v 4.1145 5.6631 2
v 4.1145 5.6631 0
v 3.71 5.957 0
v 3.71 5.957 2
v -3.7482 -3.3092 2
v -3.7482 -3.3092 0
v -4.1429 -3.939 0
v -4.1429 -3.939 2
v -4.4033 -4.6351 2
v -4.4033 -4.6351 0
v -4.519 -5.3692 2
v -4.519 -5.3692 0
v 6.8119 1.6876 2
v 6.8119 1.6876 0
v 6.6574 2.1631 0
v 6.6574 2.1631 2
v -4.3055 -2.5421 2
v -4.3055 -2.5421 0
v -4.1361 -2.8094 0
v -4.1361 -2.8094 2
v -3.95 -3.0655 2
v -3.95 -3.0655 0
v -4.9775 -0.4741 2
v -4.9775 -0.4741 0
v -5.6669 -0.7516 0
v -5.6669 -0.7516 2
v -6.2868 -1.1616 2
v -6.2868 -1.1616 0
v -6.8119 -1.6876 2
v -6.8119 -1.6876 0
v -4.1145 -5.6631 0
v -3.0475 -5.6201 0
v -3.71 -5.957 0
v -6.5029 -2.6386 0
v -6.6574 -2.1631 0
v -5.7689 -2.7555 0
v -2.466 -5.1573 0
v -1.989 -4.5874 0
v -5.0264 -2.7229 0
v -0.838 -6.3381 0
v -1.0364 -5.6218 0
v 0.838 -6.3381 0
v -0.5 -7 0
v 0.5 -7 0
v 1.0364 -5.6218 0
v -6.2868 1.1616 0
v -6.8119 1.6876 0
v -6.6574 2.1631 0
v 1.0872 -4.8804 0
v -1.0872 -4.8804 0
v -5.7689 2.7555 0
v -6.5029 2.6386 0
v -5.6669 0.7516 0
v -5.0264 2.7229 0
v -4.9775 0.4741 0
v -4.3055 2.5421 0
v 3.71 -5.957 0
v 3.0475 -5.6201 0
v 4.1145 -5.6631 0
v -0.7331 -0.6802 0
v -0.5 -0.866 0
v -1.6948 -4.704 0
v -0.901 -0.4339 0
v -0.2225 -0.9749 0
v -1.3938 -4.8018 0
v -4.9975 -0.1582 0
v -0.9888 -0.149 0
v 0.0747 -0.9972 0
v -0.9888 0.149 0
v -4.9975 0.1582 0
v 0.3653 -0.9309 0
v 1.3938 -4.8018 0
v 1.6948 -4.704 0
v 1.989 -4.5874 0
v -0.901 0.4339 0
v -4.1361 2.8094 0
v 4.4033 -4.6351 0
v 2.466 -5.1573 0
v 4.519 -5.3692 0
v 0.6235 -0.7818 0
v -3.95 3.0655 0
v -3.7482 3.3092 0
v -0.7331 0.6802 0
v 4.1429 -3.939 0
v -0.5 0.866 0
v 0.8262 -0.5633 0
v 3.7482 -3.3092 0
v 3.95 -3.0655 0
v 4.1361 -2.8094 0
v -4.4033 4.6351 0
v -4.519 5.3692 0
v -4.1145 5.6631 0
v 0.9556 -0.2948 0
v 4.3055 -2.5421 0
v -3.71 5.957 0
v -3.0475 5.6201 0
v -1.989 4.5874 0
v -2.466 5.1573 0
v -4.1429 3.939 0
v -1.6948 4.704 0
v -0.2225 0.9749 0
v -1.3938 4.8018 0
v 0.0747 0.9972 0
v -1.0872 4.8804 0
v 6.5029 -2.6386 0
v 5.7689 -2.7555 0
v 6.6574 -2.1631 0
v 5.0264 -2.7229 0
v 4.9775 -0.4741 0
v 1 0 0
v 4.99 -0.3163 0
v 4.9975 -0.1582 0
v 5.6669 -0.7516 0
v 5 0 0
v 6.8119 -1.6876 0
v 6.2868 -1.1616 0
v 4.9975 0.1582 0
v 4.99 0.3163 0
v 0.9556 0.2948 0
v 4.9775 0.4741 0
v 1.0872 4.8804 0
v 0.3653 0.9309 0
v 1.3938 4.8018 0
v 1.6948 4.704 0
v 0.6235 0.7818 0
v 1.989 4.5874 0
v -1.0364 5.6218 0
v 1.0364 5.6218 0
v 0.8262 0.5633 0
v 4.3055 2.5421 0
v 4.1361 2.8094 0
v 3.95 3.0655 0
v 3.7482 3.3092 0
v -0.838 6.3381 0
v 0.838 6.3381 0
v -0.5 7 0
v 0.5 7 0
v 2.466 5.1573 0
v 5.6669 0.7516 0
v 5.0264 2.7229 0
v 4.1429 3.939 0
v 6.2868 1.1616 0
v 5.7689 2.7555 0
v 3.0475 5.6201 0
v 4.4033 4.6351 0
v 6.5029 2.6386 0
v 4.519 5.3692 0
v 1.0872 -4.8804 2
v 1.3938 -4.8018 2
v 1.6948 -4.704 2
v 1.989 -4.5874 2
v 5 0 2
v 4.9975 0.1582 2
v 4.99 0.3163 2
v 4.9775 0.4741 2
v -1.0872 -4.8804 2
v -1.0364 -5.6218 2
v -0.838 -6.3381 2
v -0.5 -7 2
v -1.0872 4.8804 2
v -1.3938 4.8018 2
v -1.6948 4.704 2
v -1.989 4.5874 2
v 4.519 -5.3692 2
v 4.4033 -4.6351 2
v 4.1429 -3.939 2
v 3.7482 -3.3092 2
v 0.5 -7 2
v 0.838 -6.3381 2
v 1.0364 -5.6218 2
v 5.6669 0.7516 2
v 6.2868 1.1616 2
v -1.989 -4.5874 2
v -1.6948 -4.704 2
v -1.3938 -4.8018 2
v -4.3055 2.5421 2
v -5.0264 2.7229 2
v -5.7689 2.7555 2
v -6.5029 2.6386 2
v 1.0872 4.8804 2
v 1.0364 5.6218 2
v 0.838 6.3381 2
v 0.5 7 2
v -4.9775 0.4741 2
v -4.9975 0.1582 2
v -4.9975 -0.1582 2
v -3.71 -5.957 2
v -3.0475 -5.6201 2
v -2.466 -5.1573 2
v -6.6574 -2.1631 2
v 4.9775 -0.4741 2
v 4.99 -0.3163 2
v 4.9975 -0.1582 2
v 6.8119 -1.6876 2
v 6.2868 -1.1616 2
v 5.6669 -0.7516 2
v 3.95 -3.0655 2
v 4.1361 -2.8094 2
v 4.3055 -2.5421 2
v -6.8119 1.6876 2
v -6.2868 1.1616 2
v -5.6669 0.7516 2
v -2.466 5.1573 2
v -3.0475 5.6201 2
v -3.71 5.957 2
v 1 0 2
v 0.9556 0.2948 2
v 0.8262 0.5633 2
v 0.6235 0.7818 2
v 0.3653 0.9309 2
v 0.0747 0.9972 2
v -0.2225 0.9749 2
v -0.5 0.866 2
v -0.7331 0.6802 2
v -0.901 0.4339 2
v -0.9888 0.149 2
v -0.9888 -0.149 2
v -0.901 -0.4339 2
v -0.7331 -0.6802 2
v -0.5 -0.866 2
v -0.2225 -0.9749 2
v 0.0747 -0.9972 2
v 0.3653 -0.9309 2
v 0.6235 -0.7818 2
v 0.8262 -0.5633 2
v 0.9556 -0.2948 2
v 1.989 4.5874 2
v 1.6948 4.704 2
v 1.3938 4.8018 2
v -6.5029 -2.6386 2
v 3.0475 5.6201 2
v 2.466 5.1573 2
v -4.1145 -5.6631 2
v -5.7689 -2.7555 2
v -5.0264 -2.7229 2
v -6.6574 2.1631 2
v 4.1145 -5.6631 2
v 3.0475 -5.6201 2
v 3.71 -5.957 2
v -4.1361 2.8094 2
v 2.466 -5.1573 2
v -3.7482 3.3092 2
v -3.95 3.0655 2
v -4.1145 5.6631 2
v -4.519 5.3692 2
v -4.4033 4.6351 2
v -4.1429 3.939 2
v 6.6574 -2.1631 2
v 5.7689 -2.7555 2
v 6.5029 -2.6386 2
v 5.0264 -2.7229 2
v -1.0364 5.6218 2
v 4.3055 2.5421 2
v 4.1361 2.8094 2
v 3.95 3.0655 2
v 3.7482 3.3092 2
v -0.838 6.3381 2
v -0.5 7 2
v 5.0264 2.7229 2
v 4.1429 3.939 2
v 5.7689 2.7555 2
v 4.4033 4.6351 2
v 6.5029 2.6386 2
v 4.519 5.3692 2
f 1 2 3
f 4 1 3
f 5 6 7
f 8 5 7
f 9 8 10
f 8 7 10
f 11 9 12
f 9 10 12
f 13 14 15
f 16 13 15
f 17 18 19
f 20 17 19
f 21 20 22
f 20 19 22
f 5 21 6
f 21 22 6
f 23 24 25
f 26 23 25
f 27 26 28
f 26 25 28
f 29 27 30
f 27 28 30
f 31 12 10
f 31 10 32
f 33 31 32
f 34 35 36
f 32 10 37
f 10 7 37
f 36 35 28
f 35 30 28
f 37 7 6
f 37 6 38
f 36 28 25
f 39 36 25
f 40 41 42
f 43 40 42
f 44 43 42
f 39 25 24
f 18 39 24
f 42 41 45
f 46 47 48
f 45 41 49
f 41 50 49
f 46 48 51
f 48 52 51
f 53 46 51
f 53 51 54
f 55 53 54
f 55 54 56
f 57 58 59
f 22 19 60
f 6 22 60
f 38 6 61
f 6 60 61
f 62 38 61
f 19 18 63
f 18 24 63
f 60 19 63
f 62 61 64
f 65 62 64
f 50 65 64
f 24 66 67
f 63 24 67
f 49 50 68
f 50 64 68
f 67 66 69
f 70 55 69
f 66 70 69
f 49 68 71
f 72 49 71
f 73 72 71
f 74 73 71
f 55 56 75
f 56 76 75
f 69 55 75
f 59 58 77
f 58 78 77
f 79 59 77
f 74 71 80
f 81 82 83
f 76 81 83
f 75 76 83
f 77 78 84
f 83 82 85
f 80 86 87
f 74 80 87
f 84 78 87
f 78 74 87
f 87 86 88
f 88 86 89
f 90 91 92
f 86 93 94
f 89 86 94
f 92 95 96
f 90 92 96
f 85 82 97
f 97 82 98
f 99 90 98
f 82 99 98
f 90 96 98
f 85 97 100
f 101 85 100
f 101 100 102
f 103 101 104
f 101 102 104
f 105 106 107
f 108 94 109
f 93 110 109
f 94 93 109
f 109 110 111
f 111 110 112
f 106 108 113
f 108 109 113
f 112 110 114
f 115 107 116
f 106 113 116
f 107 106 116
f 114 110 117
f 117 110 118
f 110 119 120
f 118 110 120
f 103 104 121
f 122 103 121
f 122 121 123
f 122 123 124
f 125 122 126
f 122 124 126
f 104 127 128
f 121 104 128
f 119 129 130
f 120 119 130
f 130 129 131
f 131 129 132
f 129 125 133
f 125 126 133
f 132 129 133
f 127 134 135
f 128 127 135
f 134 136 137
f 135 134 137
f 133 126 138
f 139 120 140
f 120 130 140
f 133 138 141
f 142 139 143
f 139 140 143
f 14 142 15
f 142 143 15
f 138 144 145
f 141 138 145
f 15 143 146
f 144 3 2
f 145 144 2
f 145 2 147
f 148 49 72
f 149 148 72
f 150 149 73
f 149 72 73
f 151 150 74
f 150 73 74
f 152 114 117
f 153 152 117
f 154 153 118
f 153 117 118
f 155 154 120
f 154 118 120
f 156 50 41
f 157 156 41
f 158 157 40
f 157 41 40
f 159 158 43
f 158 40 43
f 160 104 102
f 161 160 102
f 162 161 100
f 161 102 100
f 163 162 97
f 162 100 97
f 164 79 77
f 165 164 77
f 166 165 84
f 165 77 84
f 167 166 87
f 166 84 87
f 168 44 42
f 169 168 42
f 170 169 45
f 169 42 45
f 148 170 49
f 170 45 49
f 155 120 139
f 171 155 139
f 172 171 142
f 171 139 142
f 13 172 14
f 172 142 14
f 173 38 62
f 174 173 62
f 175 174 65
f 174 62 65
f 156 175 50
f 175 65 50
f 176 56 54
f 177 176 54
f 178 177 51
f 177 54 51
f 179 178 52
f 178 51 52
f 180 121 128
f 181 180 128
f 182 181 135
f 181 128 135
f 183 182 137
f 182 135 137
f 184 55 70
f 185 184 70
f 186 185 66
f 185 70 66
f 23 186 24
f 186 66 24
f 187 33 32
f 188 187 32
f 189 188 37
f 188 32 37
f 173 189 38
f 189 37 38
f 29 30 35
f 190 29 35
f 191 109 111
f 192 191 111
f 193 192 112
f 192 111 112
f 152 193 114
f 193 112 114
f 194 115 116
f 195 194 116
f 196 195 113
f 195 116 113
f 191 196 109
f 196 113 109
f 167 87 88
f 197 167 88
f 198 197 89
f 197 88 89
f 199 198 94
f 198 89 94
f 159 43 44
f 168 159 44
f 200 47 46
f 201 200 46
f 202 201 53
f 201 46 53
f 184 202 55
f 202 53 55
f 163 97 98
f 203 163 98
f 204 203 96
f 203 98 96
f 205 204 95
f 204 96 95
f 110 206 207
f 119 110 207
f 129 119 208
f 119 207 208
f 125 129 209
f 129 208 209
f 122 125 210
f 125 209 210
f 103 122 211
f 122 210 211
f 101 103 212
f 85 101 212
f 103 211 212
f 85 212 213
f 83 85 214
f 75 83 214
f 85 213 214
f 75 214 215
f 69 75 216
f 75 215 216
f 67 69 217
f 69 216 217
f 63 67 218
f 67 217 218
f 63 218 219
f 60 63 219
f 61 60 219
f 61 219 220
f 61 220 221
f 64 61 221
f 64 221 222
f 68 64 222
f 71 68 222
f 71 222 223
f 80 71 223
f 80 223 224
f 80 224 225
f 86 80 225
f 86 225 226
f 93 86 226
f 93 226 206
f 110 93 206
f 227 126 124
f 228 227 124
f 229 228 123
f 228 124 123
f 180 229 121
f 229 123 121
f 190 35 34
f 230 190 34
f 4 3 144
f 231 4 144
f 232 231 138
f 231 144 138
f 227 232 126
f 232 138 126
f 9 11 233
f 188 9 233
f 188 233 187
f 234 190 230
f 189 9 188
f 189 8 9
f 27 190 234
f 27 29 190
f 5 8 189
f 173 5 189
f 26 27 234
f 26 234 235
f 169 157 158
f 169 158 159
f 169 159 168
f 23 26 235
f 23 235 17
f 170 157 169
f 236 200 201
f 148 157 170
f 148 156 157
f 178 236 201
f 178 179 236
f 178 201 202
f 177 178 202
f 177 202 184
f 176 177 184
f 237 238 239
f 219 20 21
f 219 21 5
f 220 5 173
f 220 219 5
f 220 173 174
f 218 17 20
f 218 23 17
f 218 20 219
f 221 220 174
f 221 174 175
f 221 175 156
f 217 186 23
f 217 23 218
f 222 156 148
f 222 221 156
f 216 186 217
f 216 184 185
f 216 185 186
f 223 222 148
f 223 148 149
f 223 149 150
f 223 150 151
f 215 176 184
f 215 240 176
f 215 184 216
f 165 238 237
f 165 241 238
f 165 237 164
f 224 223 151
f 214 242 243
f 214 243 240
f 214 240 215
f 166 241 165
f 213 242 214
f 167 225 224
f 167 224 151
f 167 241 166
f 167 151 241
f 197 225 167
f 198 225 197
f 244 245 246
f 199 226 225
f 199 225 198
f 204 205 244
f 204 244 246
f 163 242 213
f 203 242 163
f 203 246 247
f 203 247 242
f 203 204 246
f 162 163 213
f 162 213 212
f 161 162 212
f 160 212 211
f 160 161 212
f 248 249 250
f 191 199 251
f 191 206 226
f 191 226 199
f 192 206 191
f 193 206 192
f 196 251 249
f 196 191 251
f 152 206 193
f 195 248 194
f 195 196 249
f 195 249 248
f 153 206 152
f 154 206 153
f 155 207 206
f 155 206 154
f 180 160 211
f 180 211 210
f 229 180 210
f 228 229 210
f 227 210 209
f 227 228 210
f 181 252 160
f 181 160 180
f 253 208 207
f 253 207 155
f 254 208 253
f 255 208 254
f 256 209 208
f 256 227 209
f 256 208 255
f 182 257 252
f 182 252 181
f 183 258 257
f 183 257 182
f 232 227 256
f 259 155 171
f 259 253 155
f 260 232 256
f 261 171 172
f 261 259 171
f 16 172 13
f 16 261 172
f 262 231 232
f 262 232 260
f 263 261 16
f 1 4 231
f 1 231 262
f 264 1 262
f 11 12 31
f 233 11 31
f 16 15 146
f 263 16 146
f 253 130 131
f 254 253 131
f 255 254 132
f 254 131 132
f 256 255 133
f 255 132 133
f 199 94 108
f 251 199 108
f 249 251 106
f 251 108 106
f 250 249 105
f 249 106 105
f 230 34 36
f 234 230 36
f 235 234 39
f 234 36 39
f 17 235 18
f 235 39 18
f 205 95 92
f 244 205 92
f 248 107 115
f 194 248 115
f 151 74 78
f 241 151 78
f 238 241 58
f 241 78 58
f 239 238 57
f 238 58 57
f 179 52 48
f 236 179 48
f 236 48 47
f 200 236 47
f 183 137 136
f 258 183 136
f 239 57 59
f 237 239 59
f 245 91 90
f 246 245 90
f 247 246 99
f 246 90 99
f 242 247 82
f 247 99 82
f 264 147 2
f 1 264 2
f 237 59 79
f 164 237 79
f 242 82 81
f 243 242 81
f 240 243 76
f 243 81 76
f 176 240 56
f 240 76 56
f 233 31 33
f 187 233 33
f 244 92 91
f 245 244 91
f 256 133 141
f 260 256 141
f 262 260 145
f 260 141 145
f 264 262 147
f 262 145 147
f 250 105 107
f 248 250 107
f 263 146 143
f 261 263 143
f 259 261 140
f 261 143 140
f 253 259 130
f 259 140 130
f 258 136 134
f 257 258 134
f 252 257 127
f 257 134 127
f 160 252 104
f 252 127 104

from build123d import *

# Parameters (mm, degrees)
F1_DEPTH = 2
F2_R     = 1
F3_DEPTH = 2.001


with BuildPart() as f1:
    # F0 (on Top) → F1 (new body)
    with BuildSketch(Plane.XY):
        with BuildLine():
            ThreePointArc((4.977473, -0.474095), (4.994365, -0.237315), (5, 0))
            ThreePointArc((5, 0), (4.994365, 0.237315), (4.977473, 0.474095))
            ThreePointArc((4.977473, 0.474095), (4.755283, 1.545085), (4.305526, 2.542134))
            ThreePointArc((4.305526, 2.542134), (4.045085, 2.938926), (3.748194, 3.309236))
            ThreePointArc((3.748194, 3.309236), (2.938926, 4.045085), (1.989014, 4.587355))
            ThreePointArc((1.989014, 4.587355), (1.545085, 4.755283), (1.087233, 4.880361))
            ThreePointArc((1.087233, 4.880361), (0, 5), (-1.087233, 4.880361))
            ThreePointArc((-1.087233, 4.880361), (-1.545085, 4.755283), (-1.989014, 4.587355))
            ThreePointArc((-1.989014, 4.587355), (-2.938926, 4.045085), (-3.748194, 3.309236))
            ThreePointArc((-3.748194, 3.309236), (-4.045085, 2.938926), (-4.305526, 2.542134))
            ThreePointArc((-4.305526, 2.542134), (-4.755283, 1.545085), (-4.977473, 0.474095))
            ThreePointArc((-4.977473, 0.474095), (-5, 0), (-4.977473, -0.474095))
            ThreePointArc((-4.977473, -0.474095), (-4.755283, -1.545085), (-4.305526, -2.542134))
            ThreePointArc((-4.305526, -2.542134), (-4.045085, -2.938926), (-3.748194, -3.309236))
            ThreePointArc((-3.748194, -3.309236), (-2.938926, -4.045085), (-1.989014, -4.587355))
            ThreePointArc((-1.989014, -4.587355), (-1.545085, -4.755283), (-1.087233, -4.880361))
            ThreePointArc((-1.087233, -4.880361), (0, -5), (1.087233, -4.880361))
            ThreePointArc((1.087233, -4.880361), (1.545085, -4.755283), (1.989014, -4.587355))
            ThreePointArc((1.989014, -4.587355), (2.938926, -4.045085), (3.748194, -3.309236))
            ThreePointArc((3.748194, -3.309236), (4.045085, -2.938926), (4.305526, -2.542134))
            ThreePointArc((4.305526, -2.542134), (4.755283, -1.545085), (4.977473, -0.474095))
        make_face()
        with BuildLine():
            ThreePointArc((4.305526, 2.542134), (4.755283, 1.545085), (4.977473, 0.474095))
            ThreePointArc((4.977473, 0.474095), (5.987228, 0.940952), (6.811904, 1.687591))
            Line((6.811904, 1.687591), (6.657396, 2.163119))
            Line((6.657396, 2.163119), (6.502887, 2.638647))
            ThreePointArc((6.502887, 2.638647), (5.396847, 2.757958), (4.305526, 2.542134))
        make_face()
        with BuildLine():
            ThreePointArc((6.811904, -1.687591), (5.987228, -0.940952), (4.977473, -0.474095))
            ThreePointArc((4.977473, -0.474095), (4.755283, -1.545085), (4.305526, -2.542134))
            ThreePointArc((4.305526, -2.542134), (5.396847, -2.757958), (6.502887, -2.638647))
            Line((6.502887, -2.638647), (6.657396, -2.163119))
            Line((6.657396, -2.163119), (6.811904, -1.687591))
        make_face()
        with BuildLine():
            ThreePointArc((1.989014, 4.587355), (2.938926, 4.045085), (3.748194, 3.309236))
            ThreePointArc((3.748194, 3.309236), (4.290691, 4.28045), (4.519005, 5.369226))
            Line((4.519005, 5.369226), (4.114497, 5.663119))
            Line((4.114497, 5.663119), (3.709988, 5.957012))
            ThreePointArc((3.709988, 5.957012), (2.745054, 5.403422), (1.989014, 4.587355))
        make_face()
        with BuildLine():
            ThreePointArc((4.519005, -5.369226), (4.290691, -4.28045), (3.748194, -3.309236))
            ThreePointArc((3.748194, -3.309236), (2.938926, -4.045085), (1.989014, -4.587355))
            ThreePointArc((1.989014, -4.587355), (2.745054, -5.403422), (3.709988, -5.957012))
            Line((3.709988, -5.957012), (4.114497, -5.663119))
            Line((4.114497, -5.663119), (4.519005, -5.369226))
        make_face()
        with BuildLine():
            ThreePointArc((-1.087233, 4.880361), (0, 5), (1.087233, 4.880361))
            ThreePointArc((1.087233, 4.880361), (0.955257, 5.984962), (0.5, 7))
            Line((0.5, 7), (0, 7))
            Line((0, 7), (-0.5, 7))
            ThreePointArc((-0.5, 7), (-0.955257, 5.984962), (-1.087233, 4.880361))
        make_face()
        with BuildLine():
            ThreePointArc((0.5, -7), (0.955257, -5.984962), (1.087233, -4.880361))
            ThreePointArc((1.087233, -4.880361), (0, -5), (-1.087233, -4.880361))
            ThreePointArc((-1.087233, -4.880361), (-0.955257, -5.984962), (-0.5, -7))
            Line((-0.5, -7), (0, -7))
            Line((0, -7), (0.5, -7))
        make_face()
        with BuildLine():
            ThreePointArc((-3.748194, 3.309236), (-2.938926, 4.045085), (-1.989014, 4.587355))
            ThreePointArc((-1.989014, 4.587355), (-2.745054, 5.403422), (-3.709988, 5.957012))
            Line((-3.709988, 5.957012), (-4.114497, 5.663119))
            Line((-4.114497, 5.663119), (-4.519005, 5.369226))
            ThreePointArc((-4.519005, 5.369226), (-4.290691, 4.28045), (-3.748194, 3.309236))
        make_face()
        with BuildLine():
            ThreePointArc((-3.709988, -5.957012), (-2.745054, -5.403422), (-1.989014, -4.587355))
            ThreePointArc((-1.989014, -4.587355), (-2.938926, -4.045085), (-3.748194, -3.309236))
            ThreePointArc((-3.748194, -3.309236), (-4.290691, -4.28045), (-4.519005, -5.369226))
            Line((-4.519005, -5.369226), (-4.114497, -5.663119))
            Line((-4.114497, -5.663119), (-3.709988, -5.957012))
        make_face()
        with BuildLine():
            ThreePointArc((-4.977473, 0.474095), (-4.755283, 1.545085), (-4.305526, 2.542134))
            ThreePointArc((-4.305526, 2.542134), (-5.396847, 2.757958), (-6.502887, 2.638647))
            Line((-6.502887, 2.638647), (-6.657396, 2.163119))
            Line((-6.657396, 2.163119), (-6.811904, 1.687591))
            ThreePointArc((-6.811904, 1.687591), (-5.987228, 0.940952), (-4.977473, 0.474095))
        make_face()
        with BuildLine():
            ThreePointArc((-6.502887, -2.638647), (-5.396847, -2.757958), (-4.305526, -2.542134))
            ThreePointArc((-4.305526, -2.542134), (-4.755283, -1.545085), (-4.977473, -0.474095))
            ThreePointArc((-4.977473, -0.474095), (-5.987228, -0.940952), (-6.811904, -1.687591))
            Line((-6.811904, -1.687591), (-6.657396, -2.163119))
            Line((-6.657396, -2.163119), (-6.502887, -2.638647))
        make_face()
    extrude(amount=F1_DEPTH)

    # F2 (on face) → F3 (cut, through all)
    with BuildSketch(Plane.XY.offset(2)):
        Circle(F2_R)
    extrude(amount=-F3_DEPTH, mode=Mode.SUBTRACT)


solid = f1.part
